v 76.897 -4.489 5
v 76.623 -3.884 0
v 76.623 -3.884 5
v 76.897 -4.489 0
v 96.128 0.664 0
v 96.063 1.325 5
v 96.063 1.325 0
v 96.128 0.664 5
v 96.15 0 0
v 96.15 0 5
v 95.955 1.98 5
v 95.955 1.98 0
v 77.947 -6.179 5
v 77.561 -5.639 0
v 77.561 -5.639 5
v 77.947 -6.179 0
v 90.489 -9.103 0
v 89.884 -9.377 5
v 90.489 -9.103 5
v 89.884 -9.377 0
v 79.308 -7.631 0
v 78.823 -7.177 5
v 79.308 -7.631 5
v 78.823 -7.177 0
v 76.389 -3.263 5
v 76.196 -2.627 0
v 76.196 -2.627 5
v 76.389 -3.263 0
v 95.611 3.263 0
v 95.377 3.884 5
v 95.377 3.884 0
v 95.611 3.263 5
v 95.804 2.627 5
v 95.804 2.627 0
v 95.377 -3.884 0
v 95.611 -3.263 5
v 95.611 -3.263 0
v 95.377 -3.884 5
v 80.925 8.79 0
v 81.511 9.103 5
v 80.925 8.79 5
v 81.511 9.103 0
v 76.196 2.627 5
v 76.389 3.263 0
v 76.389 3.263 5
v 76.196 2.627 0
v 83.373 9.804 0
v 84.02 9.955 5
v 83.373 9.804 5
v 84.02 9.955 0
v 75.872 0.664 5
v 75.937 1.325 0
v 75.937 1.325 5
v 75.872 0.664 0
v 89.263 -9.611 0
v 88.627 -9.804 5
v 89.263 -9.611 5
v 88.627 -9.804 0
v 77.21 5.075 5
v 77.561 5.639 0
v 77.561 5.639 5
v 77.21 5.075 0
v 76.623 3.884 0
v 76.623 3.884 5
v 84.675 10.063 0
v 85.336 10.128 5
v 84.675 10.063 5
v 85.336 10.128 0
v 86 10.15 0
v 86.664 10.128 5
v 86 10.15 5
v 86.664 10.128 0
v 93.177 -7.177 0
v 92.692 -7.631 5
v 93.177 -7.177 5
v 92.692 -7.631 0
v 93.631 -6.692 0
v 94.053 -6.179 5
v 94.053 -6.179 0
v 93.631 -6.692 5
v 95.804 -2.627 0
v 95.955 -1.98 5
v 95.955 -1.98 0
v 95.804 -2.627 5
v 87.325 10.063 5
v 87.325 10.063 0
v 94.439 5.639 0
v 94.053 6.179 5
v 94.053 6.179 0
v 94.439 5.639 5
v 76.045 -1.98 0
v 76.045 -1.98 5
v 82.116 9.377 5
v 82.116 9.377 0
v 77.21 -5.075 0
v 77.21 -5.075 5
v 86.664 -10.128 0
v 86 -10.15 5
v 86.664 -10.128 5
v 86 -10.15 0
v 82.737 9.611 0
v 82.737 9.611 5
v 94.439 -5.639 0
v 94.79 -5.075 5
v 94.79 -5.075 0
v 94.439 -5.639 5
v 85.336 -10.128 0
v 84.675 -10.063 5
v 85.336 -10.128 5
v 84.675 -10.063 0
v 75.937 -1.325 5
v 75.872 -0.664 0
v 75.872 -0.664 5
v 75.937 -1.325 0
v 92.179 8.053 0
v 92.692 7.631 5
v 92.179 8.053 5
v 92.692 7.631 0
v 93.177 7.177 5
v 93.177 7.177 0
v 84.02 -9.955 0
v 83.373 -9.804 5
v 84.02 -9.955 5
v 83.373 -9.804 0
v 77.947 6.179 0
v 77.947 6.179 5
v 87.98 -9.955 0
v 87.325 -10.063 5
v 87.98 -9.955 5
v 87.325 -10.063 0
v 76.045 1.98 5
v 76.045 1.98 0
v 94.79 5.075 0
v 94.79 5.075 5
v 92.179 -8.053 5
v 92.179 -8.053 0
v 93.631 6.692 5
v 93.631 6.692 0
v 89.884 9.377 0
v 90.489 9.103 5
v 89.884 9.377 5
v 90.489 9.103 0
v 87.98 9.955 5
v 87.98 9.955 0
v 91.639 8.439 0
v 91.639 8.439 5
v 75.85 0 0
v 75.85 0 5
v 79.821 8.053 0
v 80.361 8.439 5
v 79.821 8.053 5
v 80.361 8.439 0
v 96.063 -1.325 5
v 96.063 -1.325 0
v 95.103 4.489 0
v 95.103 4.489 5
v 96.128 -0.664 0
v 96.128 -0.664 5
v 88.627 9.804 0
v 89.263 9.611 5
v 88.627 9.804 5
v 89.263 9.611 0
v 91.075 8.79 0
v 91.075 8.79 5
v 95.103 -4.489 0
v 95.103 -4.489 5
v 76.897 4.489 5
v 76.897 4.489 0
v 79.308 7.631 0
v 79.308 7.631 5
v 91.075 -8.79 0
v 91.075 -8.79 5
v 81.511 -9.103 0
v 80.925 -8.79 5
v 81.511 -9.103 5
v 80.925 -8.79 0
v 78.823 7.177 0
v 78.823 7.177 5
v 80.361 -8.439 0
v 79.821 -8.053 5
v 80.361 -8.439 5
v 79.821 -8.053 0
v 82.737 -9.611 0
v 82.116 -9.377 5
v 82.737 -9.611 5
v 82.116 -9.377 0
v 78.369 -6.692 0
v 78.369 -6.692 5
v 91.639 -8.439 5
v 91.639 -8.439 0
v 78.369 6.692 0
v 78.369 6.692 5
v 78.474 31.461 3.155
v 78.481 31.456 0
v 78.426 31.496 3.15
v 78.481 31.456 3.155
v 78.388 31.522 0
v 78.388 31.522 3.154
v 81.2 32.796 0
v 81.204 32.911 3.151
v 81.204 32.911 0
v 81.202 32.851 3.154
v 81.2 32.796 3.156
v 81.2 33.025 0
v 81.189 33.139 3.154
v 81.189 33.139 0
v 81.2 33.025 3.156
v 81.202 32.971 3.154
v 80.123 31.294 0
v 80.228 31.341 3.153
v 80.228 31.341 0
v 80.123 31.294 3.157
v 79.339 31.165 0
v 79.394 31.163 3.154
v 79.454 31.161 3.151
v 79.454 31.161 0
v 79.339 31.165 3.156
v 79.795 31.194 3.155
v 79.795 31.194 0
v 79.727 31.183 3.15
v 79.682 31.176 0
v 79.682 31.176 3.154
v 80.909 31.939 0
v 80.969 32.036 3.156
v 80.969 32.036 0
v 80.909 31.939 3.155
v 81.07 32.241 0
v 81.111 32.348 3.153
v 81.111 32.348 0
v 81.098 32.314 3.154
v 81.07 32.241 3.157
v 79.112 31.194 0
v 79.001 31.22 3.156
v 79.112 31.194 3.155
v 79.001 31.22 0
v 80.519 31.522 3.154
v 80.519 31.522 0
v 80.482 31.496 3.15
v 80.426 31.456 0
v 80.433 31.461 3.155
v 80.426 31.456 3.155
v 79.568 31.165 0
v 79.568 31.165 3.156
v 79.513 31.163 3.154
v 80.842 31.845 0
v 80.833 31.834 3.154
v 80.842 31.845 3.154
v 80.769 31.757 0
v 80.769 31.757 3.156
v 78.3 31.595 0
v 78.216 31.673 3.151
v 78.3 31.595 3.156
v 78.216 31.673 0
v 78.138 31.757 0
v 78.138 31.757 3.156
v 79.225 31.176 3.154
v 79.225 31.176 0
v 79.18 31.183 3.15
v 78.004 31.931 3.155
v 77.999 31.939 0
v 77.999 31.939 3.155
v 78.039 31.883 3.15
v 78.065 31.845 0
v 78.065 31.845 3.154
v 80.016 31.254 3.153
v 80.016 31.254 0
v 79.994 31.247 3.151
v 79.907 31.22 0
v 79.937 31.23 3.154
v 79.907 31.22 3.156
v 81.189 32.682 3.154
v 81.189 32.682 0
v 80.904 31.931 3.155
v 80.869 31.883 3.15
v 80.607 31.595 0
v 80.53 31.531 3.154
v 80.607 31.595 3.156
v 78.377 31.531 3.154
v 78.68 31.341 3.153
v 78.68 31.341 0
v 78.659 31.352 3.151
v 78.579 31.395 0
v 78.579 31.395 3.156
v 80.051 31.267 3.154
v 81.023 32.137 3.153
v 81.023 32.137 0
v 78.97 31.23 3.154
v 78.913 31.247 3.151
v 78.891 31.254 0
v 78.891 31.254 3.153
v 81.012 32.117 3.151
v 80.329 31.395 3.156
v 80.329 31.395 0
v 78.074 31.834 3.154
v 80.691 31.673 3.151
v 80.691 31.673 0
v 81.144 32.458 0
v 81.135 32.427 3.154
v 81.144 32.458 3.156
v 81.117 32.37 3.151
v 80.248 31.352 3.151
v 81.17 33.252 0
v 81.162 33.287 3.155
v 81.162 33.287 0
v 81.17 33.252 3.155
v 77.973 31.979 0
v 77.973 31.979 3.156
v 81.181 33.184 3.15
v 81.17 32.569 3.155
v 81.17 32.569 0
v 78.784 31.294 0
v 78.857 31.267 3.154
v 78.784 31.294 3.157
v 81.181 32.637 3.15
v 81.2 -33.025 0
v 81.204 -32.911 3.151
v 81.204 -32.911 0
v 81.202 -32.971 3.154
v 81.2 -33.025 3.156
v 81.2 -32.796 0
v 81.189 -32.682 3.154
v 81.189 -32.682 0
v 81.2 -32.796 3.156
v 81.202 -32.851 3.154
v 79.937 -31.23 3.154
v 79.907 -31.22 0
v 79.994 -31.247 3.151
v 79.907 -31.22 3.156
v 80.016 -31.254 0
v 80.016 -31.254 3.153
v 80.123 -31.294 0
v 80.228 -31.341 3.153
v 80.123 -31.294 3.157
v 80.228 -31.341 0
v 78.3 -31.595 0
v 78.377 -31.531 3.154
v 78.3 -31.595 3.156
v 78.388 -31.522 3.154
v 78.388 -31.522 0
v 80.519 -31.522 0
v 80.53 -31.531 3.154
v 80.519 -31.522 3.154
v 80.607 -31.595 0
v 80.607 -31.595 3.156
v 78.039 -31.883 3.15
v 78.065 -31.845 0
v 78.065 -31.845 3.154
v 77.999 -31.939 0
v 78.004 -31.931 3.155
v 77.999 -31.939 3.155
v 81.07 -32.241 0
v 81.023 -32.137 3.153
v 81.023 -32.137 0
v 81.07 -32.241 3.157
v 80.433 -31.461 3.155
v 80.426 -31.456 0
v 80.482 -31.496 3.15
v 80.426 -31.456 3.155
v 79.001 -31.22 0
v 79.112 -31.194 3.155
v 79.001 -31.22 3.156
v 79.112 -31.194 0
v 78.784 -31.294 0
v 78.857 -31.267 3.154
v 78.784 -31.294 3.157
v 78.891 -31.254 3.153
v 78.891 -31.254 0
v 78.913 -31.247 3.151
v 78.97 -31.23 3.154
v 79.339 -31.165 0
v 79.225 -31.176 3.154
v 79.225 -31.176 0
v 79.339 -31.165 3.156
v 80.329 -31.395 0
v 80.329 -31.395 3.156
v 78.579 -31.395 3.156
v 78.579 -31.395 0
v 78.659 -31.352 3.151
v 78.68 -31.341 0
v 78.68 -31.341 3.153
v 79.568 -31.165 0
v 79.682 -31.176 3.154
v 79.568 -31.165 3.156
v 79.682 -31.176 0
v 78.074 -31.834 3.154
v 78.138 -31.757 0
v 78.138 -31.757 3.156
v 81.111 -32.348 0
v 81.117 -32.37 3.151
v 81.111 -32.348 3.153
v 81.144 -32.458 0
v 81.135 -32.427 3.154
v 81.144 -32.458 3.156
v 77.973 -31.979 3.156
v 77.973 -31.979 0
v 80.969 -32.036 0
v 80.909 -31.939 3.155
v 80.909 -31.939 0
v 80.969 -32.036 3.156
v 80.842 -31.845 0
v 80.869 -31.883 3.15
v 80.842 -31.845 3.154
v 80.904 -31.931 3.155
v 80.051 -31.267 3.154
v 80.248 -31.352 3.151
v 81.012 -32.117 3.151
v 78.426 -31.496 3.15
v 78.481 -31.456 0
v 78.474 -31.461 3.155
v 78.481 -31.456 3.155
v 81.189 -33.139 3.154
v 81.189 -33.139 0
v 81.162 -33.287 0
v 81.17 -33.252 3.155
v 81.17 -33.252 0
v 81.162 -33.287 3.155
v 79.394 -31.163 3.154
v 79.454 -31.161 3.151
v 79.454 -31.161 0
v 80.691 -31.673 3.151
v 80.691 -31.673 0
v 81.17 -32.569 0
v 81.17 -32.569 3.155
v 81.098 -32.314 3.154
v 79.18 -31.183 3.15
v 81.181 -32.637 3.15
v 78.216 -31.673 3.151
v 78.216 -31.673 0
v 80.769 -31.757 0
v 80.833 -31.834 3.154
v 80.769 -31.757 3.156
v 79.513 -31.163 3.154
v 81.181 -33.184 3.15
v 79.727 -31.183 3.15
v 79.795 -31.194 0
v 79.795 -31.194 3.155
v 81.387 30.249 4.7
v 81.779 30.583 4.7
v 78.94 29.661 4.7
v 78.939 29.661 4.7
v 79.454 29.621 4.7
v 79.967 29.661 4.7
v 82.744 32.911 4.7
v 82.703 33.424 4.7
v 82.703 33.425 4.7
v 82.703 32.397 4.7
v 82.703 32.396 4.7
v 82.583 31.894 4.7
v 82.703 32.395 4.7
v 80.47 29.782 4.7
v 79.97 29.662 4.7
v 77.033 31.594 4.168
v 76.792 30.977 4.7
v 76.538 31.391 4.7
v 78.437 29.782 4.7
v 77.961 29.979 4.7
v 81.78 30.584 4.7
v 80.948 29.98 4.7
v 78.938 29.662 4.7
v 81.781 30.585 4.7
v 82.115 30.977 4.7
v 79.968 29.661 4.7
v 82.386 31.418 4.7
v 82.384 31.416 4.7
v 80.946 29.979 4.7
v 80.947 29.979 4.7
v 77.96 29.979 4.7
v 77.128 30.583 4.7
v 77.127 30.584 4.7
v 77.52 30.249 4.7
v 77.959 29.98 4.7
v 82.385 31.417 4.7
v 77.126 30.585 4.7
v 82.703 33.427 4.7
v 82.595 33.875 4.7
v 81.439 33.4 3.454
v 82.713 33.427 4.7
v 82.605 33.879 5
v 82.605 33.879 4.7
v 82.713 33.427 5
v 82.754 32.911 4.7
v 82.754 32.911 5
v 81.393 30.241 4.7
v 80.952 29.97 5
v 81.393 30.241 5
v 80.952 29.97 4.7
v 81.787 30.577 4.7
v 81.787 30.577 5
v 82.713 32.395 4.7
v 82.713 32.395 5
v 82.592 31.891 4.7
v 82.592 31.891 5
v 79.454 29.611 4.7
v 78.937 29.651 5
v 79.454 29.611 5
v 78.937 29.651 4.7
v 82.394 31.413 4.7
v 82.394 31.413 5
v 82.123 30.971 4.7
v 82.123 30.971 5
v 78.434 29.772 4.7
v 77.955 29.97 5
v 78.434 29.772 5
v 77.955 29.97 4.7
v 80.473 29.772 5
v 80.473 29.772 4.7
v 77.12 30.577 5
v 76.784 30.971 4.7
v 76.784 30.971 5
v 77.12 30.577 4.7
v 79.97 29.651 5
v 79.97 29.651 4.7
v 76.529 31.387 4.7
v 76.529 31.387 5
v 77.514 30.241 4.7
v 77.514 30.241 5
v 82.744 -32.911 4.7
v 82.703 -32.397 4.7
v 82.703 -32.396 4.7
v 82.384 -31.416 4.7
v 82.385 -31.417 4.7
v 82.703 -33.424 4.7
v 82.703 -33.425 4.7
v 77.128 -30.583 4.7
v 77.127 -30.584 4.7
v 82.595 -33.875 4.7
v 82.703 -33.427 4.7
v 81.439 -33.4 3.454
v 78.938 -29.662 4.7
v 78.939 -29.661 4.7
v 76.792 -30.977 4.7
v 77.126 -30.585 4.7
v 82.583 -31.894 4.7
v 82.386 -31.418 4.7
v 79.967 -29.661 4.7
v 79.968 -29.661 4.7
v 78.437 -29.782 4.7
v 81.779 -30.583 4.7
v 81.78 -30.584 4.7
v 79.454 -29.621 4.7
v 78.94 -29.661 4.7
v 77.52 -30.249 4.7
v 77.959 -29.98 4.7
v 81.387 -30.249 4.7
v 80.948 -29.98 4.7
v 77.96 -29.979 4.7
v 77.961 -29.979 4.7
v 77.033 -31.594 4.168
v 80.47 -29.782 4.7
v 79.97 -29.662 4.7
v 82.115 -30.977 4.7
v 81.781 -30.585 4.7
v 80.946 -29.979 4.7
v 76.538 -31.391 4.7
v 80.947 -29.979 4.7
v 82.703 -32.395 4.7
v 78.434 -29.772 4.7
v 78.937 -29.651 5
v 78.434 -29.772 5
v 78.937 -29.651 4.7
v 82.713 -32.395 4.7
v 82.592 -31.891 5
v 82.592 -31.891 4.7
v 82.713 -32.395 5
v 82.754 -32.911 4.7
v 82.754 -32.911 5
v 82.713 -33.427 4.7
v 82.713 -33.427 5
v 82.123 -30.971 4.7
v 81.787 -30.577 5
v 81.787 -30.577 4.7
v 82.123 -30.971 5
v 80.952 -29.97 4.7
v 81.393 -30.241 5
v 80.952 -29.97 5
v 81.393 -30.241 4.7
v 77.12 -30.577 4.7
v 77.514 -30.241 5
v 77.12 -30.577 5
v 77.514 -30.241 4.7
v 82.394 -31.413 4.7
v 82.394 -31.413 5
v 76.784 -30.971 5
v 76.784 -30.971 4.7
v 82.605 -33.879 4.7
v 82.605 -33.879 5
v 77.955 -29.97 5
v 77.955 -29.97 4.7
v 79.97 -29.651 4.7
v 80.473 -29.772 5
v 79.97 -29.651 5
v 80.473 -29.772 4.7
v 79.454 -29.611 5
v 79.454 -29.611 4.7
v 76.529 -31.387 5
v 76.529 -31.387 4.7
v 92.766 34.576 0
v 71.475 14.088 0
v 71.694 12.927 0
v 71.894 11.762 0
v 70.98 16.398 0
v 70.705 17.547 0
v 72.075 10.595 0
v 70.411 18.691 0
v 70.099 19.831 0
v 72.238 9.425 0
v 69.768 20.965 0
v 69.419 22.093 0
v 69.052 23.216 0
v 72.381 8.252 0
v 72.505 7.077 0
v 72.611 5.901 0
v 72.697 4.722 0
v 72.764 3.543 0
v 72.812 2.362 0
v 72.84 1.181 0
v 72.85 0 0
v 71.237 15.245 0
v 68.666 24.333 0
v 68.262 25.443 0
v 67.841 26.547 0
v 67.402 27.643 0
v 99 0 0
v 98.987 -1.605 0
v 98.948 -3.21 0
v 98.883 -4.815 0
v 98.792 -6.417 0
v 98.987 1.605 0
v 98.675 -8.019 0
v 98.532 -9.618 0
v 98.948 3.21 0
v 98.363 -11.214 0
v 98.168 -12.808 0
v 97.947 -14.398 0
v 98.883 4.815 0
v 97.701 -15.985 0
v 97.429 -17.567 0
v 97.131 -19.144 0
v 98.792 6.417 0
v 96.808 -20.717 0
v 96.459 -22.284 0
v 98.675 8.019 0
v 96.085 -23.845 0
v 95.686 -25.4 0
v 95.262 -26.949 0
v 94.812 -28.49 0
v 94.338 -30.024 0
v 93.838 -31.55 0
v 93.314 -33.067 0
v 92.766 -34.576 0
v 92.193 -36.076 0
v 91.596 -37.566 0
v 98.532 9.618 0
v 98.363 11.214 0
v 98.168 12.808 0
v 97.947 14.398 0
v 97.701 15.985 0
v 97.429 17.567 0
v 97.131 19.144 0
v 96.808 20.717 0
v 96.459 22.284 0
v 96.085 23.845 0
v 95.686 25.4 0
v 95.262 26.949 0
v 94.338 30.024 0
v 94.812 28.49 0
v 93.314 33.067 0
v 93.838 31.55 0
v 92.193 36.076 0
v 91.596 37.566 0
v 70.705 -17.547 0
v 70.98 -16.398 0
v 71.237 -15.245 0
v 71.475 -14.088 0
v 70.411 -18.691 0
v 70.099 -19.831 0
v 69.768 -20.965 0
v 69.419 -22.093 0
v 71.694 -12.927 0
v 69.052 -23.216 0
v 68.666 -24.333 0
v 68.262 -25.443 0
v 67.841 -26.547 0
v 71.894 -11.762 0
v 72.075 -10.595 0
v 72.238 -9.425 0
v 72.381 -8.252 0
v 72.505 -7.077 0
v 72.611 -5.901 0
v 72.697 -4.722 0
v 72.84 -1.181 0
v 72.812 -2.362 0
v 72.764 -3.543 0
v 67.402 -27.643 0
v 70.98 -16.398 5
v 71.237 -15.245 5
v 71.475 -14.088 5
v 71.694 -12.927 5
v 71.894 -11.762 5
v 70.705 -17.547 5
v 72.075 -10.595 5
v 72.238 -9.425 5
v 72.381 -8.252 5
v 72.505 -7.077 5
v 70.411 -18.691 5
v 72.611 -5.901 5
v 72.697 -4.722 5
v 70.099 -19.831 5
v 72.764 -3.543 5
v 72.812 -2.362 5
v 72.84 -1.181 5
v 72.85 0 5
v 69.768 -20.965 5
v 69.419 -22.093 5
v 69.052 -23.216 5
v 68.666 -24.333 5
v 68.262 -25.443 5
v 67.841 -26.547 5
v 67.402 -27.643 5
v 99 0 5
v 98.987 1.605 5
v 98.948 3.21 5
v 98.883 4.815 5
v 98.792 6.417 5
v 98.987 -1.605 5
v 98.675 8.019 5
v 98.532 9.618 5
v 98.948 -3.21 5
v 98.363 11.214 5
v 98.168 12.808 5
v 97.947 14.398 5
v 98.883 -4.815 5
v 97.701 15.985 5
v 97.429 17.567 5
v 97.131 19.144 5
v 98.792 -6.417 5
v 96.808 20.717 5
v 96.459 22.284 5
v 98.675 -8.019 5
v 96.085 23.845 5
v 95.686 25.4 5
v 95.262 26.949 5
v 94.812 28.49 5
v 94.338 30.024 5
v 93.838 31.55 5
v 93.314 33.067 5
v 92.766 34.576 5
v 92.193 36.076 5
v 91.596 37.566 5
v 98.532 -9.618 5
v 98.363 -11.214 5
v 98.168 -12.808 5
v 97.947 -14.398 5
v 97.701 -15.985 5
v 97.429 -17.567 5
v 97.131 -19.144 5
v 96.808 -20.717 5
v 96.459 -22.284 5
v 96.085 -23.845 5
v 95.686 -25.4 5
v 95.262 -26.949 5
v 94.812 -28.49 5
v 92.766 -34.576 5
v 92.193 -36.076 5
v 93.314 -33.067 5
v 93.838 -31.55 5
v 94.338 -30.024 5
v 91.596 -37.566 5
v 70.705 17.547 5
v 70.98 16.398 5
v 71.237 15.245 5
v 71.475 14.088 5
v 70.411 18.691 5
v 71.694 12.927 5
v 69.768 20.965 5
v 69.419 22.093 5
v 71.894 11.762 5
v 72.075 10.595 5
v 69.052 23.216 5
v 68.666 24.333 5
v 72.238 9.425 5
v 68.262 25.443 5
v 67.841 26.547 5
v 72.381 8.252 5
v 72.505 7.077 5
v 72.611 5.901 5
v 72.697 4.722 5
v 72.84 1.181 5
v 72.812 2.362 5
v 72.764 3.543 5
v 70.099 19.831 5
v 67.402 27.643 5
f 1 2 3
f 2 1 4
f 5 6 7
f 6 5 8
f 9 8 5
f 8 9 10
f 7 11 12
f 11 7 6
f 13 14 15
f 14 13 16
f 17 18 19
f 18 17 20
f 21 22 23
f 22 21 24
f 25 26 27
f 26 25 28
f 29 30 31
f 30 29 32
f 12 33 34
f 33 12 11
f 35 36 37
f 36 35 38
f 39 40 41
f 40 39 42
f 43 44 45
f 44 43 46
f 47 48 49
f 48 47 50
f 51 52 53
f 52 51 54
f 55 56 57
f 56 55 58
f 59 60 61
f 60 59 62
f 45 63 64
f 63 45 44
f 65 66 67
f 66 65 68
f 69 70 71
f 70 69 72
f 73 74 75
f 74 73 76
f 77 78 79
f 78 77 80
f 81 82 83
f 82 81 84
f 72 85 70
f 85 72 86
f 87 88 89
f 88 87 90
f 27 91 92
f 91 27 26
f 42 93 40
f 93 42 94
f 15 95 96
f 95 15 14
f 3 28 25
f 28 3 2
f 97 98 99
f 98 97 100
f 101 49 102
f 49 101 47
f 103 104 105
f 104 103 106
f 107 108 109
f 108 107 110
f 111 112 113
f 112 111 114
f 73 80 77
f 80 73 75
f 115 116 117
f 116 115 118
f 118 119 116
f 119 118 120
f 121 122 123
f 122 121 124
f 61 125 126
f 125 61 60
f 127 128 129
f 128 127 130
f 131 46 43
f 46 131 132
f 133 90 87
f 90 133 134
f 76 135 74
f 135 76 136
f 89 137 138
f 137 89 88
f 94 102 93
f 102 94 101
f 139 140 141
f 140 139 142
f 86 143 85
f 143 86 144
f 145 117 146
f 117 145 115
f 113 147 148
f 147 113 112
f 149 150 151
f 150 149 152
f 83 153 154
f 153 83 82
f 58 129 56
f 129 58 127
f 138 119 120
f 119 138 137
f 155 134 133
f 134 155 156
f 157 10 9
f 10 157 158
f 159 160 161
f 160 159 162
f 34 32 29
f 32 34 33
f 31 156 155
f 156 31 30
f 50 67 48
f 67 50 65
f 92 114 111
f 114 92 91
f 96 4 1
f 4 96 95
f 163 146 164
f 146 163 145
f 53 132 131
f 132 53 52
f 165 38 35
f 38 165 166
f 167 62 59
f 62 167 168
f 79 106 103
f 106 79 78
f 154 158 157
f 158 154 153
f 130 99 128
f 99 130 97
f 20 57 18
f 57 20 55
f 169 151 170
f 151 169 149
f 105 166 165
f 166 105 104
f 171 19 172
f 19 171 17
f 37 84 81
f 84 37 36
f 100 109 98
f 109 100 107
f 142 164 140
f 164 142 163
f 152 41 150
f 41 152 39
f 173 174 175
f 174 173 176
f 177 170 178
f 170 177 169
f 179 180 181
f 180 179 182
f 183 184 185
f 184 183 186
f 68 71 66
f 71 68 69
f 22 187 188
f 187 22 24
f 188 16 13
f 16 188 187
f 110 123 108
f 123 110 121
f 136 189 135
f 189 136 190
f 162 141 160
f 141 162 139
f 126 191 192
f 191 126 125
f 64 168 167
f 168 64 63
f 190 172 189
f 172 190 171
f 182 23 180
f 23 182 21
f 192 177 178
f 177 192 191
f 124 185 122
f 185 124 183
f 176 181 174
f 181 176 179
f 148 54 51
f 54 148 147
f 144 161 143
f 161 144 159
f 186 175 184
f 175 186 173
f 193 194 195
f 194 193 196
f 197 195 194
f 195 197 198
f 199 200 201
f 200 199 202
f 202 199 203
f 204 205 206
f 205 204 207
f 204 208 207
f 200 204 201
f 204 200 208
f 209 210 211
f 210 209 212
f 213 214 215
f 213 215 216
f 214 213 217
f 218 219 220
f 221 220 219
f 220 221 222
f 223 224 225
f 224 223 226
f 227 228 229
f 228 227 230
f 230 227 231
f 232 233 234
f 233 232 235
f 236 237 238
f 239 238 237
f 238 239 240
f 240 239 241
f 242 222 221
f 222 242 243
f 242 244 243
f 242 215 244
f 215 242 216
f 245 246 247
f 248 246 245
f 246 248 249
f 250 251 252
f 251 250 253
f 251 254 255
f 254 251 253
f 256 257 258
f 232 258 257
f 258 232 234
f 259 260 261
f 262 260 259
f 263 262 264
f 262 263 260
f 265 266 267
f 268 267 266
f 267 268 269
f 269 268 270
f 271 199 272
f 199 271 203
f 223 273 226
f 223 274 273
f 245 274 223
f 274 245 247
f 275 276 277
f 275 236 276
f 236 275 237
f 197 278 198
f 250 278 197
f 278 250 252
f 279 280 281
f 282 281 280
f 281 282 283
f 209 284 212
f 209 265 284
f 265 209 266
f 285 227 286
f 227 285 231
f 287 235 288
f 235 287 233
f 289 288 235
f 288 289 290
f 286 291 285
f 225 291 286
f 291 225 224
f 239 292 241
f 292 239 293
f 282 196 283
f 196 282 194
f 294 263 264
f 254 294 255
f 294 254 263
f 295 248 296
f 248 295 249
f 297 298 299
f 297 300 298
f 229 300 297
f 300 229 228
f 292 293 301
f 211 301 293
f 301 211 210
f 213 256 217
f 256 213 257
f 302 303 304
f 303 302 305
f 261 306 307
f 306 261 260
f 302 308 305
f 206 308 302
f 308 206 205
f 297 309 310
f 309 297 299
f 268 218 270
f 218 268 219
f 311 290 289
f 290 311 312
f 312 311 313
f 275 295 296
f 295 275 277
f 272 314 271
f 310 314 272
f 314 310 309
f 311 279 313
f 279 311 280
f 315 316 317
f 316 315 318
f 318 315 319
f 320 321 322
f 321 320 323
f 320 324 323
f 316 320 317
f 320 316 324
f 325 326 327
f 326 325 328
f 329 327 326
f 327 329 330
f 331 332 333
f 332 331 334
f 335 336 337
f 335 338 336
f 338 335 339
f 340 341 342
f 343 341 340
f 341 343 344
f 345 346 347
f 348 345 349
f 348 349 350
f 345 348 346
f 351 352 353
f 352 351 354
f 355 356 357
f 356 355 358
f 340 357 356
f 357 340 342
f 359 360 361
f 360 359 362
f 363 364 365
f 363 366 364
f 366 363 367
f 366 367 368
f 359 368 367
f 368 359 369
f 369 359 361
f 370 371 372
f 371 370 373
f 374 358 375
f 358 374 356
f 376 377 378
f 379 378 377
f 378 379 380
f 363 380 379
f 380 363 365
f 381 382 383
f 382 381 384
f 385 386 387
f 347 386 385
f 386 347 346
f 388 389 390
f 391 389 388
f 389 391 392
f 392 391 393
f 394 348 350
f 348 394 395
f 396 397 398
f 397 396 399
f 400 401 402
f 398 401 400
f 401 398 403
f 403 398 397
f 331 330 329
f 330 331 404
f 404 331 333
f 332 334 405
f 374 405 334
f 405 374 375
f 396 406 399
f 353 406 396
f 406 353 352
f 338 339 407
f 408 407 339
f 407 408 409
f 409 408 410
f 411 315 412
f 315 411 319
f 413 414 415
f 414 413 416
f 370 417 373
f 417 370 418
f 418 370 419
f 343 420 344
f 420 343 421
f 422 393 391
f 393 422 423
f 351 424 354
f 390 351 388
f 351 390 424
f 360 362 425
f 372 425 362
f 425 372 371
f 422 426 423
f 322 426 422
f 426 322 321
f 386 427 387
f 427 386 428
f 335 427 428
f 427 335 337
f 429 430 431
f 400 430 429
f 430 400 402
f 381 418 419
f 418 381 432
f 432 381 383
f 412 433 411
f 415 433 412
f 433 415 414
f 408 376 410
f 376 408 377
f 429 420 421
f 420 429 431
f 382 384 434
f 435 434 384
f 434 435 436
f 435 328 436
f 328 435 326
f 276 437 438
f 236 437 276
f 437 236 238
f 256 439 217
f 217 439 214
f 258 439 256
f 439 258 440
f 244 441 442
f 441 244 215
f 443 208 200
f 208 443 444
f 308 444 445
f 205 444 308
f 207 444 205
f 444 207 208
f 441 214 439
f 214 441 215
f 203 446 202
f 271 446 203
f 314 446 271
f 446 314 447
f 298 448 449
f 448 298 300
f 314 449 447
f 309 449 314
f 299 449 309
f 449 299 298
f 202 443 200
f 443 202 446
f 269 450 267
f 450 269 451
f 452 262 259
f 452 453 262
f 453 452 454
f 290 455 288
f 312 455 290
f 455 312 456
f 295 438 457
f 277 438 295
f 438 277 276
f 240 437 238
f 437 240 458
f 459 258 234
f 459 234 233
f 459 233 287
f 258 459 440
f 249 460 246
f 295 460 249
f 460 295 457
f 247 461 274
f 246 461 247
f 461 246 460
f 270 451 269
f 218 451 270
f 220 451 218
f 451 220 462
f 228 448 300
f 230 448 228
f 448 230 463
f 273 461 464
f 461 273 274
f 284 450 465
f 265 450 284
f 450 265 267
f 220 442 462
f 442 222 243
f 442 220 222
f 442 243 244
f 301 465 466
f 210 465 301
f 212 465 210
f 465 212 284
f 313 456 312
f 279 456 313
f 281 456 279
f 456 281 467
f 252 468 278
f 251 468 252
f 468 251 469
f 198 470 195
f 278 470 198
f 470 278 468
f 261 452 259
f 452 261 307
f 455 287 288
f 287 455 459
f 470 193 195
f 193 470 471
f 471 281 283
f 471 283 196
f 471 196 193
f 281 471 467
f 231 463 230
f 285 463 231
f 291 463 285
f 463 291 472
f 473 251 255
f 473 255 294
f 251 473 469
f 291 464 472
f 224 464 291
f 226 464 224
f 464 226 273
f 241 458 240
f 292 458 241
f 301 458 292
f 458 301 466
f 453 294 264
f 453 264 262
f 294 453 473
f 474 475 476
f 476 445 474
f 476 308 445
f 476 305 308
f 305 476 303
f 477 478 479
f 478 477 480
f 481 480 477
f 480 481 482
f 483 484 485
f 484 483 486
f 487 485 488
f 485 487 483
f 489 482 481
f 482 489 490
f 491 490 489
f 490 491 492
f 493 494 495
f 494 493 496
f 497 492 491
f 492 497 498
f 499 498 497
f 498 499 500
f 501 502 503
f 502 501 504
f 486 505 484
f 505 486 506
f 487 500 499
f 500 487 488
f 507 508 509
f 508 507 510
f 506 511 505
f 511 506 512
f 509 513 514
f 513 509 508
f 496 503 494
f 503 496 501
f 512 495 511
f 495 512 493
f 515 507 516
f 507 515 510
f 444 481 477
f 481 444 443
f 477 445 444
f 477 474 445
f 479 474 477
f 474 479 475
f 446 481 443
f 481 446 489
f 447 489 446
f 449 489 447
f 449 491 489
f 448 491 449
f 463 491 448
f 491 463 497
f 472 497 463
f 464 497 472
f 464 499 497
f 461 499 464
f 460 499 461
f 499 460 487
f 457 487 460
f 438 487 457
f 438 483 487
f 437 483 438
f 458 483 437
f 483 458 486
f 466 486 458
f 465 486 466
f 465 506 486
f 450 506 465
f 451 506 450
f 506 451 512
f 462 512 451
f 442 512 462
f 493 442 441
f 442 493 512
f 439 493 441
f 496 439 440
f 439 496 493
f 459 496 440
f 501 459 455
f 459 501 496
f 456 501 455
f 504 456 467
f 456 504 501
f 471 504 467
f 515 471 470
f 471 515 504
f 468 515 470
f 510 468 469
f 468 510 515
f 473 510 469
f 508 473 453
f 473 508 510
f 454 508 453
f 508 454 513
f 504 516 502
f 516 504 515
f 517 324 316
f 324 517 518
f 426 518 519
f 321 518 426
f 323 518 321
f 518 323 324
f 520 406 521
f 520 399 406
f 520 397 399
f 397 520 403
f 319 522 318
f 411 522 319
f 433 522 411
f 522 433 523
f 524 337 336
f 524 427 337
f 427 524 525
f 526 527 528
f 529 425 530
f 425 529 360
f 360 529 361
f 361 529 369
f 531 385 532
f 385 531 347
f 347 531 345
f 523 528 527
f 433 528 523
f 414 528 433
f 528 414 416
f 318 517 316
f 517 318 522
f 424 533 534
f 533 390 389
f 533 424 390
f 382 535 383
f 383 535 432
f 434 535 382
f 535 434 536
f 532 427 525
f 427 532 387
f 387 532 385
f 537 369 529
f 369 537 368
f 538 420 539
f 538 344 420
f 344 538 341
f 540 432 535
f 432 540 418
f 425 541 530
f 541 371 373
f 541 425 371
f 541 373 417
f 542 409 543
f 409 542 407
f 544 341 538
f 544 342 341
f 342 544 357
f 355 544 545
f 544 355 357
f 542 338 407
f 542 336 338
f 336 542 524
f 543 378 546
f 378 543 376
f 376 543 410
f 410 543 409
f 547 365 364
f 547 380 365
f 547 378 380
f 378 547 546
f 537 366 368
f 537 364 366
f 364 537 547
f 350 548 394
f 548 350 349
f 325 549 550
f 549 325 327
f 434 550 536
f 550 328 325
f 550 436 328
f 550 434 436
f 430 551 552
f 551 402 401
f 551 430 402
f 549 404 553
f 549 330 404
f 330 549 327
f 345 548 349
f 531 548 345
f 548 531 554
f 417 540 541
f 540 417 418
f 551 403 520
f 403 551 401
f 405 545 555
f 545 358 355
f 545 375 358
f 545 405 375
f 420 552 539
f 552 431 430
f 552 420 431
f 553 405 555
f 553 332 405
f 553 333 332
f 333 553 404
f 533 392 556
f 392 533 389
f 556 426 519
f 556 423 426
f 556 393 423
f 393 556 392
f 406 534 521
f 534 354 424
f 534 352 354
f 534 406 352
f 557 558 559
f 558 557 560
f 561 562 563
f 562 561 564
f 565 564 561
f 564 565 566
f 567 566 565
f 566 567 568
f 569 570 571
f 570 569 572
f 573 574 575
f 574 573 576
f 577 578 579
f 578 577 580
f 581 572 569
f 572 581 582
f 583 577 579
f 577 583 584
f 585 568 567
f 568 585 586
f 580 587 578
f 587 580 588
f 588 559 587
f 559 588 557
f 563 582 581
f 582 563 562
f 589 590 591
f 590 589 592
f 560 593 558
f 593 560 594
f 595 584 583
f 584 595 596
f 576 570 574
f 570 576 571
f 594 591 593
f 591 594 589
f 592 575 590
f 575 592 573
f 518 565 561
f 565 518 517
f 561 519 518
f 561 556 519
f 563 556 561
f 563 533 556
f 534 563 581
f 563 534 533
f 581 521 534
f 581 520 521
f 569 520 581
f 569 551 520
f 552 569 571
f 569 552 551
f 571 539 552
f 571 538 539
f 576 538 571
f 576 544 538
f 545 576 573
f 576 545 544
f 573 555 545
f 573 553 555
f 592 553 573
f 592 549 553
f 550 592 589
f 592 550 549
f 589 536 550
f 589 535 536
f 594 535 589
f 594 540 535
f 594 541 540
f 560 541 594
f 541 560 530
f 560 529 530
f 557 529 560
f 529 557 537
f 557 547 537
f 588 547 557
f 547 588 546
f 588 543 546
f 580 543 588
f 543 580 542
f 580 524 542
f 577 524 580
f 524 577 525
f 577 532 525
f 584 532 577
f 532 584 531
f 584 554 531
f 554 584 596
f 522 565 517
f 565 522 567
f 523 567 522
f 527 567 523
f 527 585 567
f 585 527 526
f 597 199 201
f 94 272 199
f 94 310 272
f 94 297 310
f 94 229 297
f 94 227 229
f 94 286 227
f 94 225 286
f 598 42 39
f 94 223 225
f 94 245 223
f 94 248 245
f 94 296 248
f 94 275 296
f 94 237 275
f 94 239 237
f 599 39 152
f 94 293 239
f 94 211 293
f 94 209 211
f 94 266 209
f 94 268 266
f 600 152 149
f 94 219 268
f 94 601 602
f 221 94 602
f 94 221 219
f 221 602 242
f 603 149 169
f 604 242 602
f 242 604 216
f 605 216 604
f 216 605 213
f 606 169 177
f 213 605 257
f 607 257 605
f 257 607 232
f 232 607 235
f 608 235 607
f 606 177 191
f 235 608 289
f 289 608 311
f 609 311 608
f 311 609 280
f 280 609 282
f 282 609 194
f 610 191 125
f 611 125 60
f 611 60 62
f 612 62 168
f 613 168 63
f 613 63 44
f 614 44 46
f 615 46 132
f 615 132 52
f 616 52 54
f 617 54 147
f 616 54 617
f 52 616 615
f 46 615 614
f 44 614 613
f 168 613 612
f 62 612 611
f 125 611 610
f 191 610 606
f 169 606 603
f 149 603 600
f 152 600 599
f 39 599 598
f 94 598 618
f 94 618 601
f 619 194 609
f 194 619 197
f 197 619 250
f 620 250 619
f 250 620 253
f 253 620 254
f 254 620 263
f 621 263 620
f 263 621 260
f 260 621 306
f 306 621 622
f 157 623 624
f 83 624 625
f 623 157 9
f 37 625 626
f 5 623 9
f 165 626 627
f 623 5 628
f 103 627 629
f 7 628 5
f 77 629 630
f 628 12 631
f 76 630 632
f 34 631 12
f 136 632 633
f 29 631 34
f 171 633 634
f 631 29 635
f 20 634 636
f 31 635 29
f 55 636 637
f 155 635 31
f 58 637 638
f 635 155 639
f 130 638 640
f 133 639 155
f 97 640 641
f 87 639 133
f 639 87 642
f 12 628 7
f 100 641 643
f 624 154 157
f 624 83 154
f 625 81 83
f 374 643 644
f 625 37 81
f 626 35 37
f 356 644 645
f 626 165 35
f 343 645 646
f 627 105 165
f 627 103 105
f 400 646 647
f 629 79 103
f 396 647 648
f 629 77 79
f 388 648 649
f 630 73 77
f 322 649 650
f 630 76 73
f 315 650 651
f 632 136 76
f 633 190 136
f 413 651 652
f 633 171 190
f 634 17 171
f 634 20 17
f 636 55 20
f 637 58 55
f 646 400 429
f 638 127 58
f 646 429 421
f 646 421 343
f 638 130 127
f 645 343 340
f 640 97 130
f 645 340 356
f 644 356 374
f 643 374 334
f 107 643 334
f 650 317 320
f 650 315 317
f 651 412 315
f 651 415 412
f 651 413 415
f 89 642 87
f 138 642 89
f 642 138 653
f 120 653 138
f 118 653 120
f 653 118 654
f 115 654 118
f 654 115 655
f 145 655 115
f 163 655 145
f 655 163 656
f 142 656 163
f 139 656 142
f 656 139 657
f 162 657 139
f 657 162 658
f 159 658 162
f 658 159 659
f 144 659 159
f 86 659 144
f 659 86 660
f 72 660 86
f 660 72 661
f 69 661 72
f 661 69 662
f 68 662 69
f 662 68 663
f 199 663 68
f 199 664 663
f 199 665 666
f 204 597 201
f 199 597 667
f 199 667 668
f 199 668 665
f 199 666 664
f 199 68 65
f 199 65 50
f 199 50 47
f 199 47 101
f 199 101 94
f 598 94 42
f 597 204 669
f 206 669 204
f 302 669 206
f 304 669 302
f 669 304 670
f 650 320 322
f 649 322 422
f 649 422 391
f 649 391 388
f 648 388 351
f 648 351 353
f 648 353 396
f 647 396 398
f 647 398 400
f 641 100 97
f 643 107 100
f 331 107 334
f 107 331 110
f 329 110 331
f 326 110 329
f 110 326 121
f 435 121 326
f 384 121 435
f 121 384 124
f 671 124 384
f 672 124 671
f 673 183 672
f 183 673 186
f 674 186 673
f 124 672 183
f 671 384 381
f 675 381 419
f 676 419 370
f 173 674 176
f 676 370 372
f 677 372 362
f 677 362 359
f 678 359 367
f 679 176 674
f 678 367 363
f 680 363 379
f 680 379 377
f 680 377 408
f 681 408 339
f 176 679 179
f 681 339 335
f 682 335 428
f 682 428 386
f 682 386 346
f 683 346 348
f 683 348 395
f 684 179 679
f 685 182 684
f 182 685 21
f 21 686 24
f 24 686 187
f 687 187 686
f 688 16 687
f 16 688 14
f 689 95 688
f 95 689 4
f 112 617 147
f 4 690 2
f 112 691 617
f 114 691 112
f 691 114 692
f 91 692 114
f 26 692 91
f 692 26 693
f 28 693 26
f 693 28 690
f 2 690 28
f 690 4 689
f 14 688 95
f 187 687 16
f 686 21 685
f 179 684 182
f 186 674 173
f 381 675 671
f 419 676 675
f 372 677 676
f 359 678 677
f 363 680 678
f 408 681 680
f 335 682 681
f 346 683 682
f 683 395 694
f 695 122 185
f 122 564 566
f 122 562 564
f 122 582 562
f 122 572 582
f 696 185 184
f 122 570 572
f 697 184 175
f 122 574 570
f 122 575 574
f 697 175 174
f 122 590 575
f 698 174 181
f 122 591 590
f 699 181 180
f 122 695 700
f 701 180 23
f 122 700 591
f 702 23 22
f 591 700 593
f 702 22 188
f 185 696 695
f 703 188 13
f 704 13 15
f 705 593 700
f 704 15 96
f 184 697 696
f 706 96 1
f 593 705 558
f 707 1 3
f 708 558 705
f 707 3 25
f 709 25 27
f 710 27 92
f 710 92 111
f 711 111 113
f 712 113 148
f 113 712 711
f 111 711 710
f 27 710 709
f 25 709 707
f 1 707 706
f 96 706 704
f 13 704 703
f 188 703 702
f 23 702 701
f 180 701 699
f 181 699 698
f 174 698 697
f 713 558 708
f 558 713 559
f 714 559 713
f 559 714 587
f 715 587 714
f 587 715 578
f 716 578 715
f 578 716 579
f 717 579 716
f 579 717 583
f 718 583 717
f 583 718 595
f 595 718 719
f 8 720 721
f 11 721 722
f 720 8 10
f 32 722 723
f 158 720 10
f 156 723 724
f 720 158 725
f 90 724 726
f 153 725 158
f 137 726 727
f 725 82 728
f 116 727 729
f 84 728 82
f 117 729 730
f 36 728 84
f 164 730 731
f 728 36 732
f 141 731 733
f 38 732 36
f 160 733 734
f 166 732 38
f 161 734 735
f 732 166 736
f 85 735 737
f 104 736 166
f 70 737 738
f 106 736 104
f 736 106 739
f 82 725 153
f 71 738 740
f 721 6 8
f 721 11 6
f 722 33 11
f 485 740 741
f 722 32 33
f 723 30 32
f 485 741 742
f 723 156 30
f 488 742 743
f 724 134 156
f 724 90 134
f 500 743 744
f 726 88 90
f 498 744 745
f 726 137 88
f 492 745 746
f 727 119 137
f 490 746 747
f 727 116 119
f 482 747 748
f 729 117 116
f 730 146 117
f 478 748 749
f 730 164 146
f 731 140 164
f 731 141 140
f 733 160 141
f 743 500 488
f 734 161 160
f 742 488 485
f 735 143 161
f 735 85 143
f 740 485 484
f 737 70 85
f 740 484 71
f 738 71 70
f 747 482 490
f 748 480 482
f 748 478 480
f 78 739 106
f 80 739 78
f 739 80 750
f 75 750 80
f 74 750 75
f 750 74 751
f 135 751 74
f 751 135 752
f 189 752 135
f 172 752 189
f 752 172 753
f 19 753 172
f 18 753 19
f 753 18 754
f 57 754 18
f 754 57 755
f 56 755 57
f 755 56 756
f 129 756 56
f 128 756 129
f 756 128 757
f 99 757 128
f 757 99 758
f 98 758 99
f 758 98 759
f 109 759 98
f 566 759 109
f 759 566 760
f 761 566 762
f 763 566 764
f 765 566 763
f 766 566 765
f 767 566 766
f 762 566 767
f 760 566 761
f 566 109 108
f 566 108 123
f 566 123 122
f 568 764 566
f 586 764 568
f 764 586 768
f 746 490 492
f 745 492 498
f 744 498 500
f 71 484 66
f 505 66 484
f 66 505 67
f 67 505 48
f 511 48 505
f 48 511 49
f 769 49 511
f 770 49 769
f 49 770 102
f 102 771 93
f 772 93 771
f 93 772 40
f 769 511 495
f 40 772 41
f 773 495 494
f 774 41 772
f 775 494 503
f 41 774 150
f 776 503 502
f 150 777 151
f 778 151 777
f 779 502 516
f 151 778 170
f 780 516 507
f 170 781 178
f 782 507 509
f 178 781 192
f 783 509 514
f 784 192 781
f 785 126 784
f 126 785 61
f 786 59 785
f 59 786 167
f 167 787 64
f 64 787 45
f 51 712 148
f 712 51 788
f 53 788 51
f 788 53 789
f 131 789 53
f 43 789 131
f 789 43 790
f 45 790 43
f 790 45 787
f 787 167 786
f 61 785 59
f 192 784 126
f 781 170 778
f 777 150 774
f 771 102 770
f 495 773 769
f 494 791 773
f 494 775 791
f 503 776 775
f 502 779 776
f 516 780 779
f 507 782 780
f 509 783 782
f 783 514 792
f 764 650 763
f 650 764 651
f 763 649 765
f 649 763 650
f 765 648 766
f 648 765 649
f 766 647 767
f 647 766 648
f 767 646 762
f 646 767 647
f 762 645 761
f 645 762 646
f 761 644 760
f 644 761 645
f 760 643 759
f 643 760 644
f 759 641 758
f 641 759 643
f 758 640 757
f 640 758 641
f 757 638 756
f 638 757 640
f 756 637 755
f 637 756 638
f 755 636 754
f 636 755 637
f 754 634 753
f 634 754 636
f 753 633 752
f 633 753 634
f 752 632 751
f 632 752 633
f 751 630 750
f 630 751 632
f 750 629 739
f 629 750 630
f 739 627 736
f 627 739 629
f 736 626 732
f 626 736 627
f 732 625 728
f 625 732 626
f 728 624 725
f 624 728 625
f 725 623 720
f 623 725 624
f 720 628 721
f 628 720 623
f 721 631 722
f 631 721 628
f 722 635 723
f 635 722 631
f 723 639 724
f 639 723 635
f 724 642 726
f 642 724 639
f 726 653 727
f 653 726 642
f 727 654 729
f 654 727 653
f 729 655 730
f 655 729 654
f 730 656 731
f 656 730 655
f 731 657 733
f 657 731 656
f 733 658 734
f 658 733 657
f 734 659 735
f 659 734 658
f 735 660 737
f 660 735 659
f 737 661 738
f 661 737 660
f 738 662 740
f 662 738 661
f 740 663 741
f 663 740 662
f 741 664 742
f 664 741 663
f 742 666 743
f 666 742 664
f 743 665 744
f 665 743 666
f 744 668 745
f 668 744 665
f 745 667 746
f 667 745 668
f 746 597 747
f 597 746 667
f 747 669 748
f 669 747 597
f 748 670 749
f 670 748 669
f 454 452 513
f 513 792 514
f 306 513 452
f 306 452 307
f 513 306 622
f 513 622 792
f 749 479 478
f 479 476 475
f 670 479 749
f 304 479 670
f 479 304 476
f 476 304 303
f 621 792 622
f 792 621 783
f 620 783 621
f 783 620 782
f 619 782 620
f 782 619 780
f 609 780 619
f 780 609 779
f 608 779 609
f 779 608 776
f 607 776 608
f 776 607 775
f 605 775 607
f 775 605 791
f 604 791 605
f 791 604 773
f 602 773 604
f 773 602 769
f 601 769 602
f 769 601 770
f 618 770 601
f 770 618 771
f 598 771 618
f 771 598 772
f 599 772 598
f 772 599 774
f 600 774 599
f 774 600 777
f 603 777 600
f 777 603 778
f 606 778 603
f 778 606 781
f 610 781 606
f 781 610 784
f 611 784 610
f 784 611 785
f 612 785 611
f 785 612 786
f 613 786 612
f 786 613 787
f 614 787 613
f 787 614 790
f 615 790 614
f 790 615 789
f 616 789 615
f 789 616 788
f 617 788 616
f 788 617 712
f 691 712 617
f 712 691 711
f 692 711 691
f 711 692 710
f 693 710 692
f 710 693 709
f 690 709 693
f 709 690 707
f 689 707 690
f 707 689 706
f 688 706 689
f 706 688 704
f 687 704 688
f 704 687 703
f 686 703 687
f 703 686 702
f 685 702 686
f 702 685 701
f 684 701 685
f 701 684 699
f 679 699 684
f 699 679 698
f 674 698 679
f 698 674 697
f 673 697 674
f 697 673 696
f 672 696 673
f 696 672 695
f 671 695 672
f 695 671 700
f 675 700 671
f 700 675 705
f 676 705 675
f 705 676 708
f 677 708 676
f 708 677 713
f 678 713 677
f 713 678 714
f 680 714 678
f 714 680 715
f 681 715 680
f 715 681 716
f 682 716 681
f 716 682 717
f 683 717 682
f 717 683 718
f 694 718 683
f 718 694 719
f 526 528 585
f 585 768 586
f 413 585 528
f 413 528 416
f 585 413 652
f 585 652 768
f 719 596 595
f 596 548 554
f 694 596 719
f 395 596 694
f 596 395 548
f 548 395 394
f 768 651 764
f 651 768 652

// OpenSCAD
// file: parameters.scad
// =============================================================================
// Gen-CE — nightly 2026-10-14 (physics_scorer, honest magpylib watts)
// Wire-saver stator for the Gen-CD rotors: only 3.9 mm of copper (≈9 layers), magnet faces ≈6.5 mm apart, peak Bz ≈0.70 T. Uses ≈300 m of wire (≈80 m less than Gen-CD) and still clears Gen-BX; shares every rotor part, the steel, the frame rods and the bearing bridges with Gen-CD, so the two stators swap on the same machine.
// Clocking 0 deg (magnets N facing S) + D-flat keyed bore + index notch + flip-symmetric hole map.
// Windable 2-piece bobbin; turns = physics_scorer turns_fit; copper only between flanges.
// Steel back-iron: 2× Ø198 × 4.76 mm (3/16") mild-steel discs (steel_backiron_disc.dxf); magnets sit ON the steel
// (through-pockets) -> score with --back-iron. Night 2026-10-14.
// =============================================================================
topology            = "dual_rotor";

// --- Wire / winding (physics_scorer winding-fit) -------------------------------
wire_awg            = 26;
wire_od             = 0.45;     // insulated OD mm (bare 0.405)
fill_realistic      = 0.65;     // insulated-wire area / window (DENSE layered wind with a jig; scorer cap 0.65)
turns               = 288;       // = physics_scorer turns_fit (do NOT raise)
coil_former_type    = "bobbin";
coil_core_inset     = 18.10;     // radial copper build: hub = copper boundary inset by this
wind_build_axial    = 0.0;      // nothing proud of the flanges
wind_build_radial   = 0.0;

// --- Bobbin (base + lid) ---------------------------------------------------------
coil_id_r           = 64.00;    // copper boundary sector
coil_od_r           = 104.00;
span_deg            = 26.87;    // = pitch - 2*asin((wall+0.85)/coil_id_r) -> >=1.2 mm stator web
former_web          = 3.90;     // copper height between flanges (TALL copper: steel keeps Bz up)
flange_t            = 0.80;     // >= 0.8 mm FDM wall rule (tall winds push on the flanges)
wall                = 0.80;     // flange lip beyond copper
former_bare_h       = former_web + 2 * flange_t;
coil_envelope_h     = former_bare_h + 2 * wind_build_axial;
tab_w               = 7.0;
tab_len             = 7.0;
tab_h               = former_bare_h / 2;
pin_d               = 1.9;      // 1.75 mm filament locating pin
coil_mount_r        = coil_od_r + 0.2 + 4.0;
lead_y              = 1.6;
lead_slot_w         = 0.9;
lead_groove_d       = 0.6;

// --- Gap -------------------------------------------------------------------------
run_clear           = 0.50;     // rotor face -> flange
gap_spacer_h        = run_clear + wind_build_axial;
m2m                 = coil_envelope_h + 2 * run_clear;   // rotor face to rotor face (= gap_sleeve length)

// --- Stator ----------------------------------------------------------------------
coil_stations       = 12;
bay_clear           = 0.35;     // 0.35 mm: bobbin BASES print IN PLACE inside the stator bays (print-in-place gap), then pop out
stator_thick        = former_bare_h;                        // bobbins flush both faces
stator_od           = 229.0;
shaft_clear_stator  = 14.0;     // stator is static; gap sleeve OD 12 spins inside
stator_ir           = 58.85;    // ANNULAR stator: open centre (nested one-plate pack); inner rim 4.0 mm

// --- Rotor(s) --------------------------------------------------------------------
magnet_Br           = 1.43;     // N52
magnet_d_large      = 20.0;
magnet_h_large      = 5.0;      // one O20x5 per pocket
magnet_h_small      = 5.0;      // unused: no O5 pockets in this kit
halbach_magnetisation = "none";  // NO O5 assist magnets in this kit (scan: they lower the 4-pole score)
rotor_b_same_axis   = true;     // same-index magnets share one axis: N faces S across the gap
large_pocket_d      = 20.3;
small_pocket_d      = 5.3;
pocket_h            = 5.00;     // THROUGH the carrier: magnet back face sits on the steel disc (FLUSH seat: carrier = magnet height, magnet face level with the rotor face)
large_n             = 8;
R_large             = 86.0;
small_r_list        = [];       // no O5 pockets
carrier_od          = 198.0;
ring_ir             = 72.85;    // RING rotor: PLA magnet ring r ring_ir..carrier_od/2 (steel disc = structural rotor)
hub_flange_od       = 74.0;     // separate rotor_hub flange (inside the ring, flush with the ring face)
csk_d               = 6.6;      // M3 countersunk head pocket (ISO 10642 head 6.0 nominal) on the stator face
csk_depth           = 1.55;     // = (csk_d - m3_clear) / 2: 90 deg cone; head sits 0.3 mm below the face
n_seg               = 8;        // magnet-carrier ARCS per rotor (segmented carrier)
seg_deg             = 360 / n_seg;
seg_start           = -22.5;   // arc edge angle (between pocket 0 and its clamp bolt)
seg_kerf_deg        = 0.4;      // gap between neighbouring arcs on the steel
carrier_thick       = pocket_h;
hub_h               = 12.0;     // > steel_t + insert: radial set-screw clears the steel
hub_od              = 24.0;     // slim hub so the M4 brace rods fit at R~18 inside the coil ring
hub_insert_d        = 4.0;      // M3 heat-set insert, radial, bears on the D-flat
rotor_b_offset_deg  = 0.0;      // CLOCKING: magnets directly opposite
shaft_key           = "dflat";
dflat_depth         = 0.5;      // 8 mm shaft with 0.5 mm flat (7.5 across flat)
index_notch_d       = 3.0;

// --- Steel back-iron (buyable laser-cut) -------------------------------------------
steel_t             = 4.76;      // mild steel thickness (image method ignores it; sized from steel_flux.py so the return path stays well below saturation)
steel_center_hole   = 26.0;     // slips over the rotor hub (OD 24)
steel_od            = carrier_od;   // steel disc OD = rotor carrier OD

// --- Modular MAX interface ----------------------------------------------------------
shaft_bore          = 8.35;
dflat_x             = 4.0 - dflat_depth + (shaft_bore - 8.0) / 2;
bearing_d           = 21.85;
bearing_h           = 7.2;
m3_clear            = 3.5;
bolt_r_inner        = 30.0;     // M3 steel-disc clamp bolts (inside the magnet ring)
bolt_n_inner        = 4;
bolt_inner_angles   = [0, 90, 180, 270];
bolt_r_outer        = 86.0;     // second M3 steel-disc clamp ring
bolt_outer_angles   = [22.5, 67.5, 112.5, 157.5, 202.5, 247.5, 292.5, 337.5];
flange_bolt_r       = 109.5;     // frame rods: OUTSIDE the rotor OD (rotors spin inside them)
flange_bolt_n       = 4;
flange_bolt_offset  = 45.00;    // between coil stations -> never cuts a lead groove/tab
brace_r             = 18.0;
brace_d             = 4.3;      // temporary M4 jack rods (assembly only)
brace_n             = 4;
brace_angles        = [45, 135, 225, 315];          // flip-symmetric

spacer_pad_od       = 14.0;
spacer_pad_id       = m3_clear;
endbell_od          = 229.0;
endbell_thick       = 8.0;
endbell_shaft_clear = 10.0;
collar_h            = 10.0;
standoff_od         = 9.0;
frame_standoff_h    = run_clear + carrier_thick + hub_h + collar_h + 2.0;
sleeve_od           = 12.0;
plate_max_mm        = 410;

$fn = 64;
// main file
// Gen-CE — rotor B MAGNET-CARRIER ARC (2026-10-14 segmented nested pack). Print x8 per rotor (16 total
// for A+B; A and B arcs are the same print). Each arc covers seg_deg = 360/n_seg of the R_large ring and holds 1 O20 through-pockets
// + 1 countersunk M3 clamp holes (inter-pole, R bolt_r_outer) to the steel disc. The 4.76 mm mild-steel disc is the structural
// rotor; the separate rotor_hub (D-flat) bolts to it at R bolt_r_inner. Arcs pack around/inside the other parts on ONE plate,
// and any arc can be swapped/re-printed on its own (modular magnet carrier).
// CLOCKING: arc j spans [j*seg_deg + seg_start, (j+1)*seg_deg + seg_start - kerf]; pockets at i*360/large_n + rotor_b_offset_deg (= 0).
// The arc's bolt holes sit on the same 8-fold map as the pockets, so every arc position puts pockets on the same steel angles;
// pocket 0 = the pocket over the STEEL index notch (clocked to the hub D-flat). Rotor B arcs = same print, flipped to face A.
// Print countersinks UP (stator face up); the arc lies flat (5 mm), no supports.
include <parameters.scad>;
$fn = 96;
module ring_holes_2d() {
    for (a = bolt_outer_angles) translate([bolt_r_outer*cos(a), bolt_r_outer*sin(a)]) circle(d=m3_clear);
    translate([carrier_od/2, 0]) circle(d=index_notch_d, $fn=24);
}
module hub_holes_2d() {
    for (a = bolt_inner_angles) translate([bolt_r_inner*cos(a), bolt_r_inner*sin(a)]) circle(d=m3_clear);
    for (a = brace_angles) translate([brace_r*cos(a), brace_r*sin(a)]) circle(d=brace_d);
    translate([hub_flange_od/2, 0]) circle(d=index_notch_d, $fn=24);
}
module csk(r, angles) {   // M3 countersunk (ISO 10642, 90 deg) head pocket on the STATOR face, head 0.3 mm below the face
    for (a = angles) translate([r*cos(a), r*sin(a), 0]) {
        translate([0, 0, carrier_thick - 0.3 - csk_depth - 0.2]) cylinder(d1=m3_clear - 0.4, d2=csk_d, h=csk_depth + 0.2 + 0.01, $fn=40);
        translate([0, 0, carrier_thick - 0.3]) cylinder(d=csk_d, h=0.4, $fn=40);
    }
}

off = rotor_b_offset_deg;
module arc_2d() {
    a0 = seg_start + seg_kerf_deg / 2; a1 = seg_start + seg_deg - seg_kerf_deg / 2;
    polygon(concat(
        [for (k = [0 : 48]) let(t = a0 + (a1 - a0) * k / 48) [(carrier_od/2) * cos(t), (carrier_od/2) * sin(t)]],
        [for (k = [48 : -1 : 0]) let(t = a0 + (a1 - a0) * k / 48) [ring_ir * cos(t), ring_ir * sin(t)]]));
}
difference() {
    linear_extrude(carrier_thick) arc_2d();
    for (i = [0 : large_n-1]) {
        a = i * 360 / large_n + off;
        translate([R_large*cos(a), R_large*sin(a), -0.1]) cylinder(d=large_pocket_d, h=carrier_thick + 0.2);
    }
    for (a = bolt_outer_angles) translate([bolt_r_outer*cos(a), bolt_r_outer*sin(a), -0.1]) cylinder(d=m3_clear, h=carrier_thick + 0.2);
    csk(bolt_r_outer, bolt_outer_angles);
}
